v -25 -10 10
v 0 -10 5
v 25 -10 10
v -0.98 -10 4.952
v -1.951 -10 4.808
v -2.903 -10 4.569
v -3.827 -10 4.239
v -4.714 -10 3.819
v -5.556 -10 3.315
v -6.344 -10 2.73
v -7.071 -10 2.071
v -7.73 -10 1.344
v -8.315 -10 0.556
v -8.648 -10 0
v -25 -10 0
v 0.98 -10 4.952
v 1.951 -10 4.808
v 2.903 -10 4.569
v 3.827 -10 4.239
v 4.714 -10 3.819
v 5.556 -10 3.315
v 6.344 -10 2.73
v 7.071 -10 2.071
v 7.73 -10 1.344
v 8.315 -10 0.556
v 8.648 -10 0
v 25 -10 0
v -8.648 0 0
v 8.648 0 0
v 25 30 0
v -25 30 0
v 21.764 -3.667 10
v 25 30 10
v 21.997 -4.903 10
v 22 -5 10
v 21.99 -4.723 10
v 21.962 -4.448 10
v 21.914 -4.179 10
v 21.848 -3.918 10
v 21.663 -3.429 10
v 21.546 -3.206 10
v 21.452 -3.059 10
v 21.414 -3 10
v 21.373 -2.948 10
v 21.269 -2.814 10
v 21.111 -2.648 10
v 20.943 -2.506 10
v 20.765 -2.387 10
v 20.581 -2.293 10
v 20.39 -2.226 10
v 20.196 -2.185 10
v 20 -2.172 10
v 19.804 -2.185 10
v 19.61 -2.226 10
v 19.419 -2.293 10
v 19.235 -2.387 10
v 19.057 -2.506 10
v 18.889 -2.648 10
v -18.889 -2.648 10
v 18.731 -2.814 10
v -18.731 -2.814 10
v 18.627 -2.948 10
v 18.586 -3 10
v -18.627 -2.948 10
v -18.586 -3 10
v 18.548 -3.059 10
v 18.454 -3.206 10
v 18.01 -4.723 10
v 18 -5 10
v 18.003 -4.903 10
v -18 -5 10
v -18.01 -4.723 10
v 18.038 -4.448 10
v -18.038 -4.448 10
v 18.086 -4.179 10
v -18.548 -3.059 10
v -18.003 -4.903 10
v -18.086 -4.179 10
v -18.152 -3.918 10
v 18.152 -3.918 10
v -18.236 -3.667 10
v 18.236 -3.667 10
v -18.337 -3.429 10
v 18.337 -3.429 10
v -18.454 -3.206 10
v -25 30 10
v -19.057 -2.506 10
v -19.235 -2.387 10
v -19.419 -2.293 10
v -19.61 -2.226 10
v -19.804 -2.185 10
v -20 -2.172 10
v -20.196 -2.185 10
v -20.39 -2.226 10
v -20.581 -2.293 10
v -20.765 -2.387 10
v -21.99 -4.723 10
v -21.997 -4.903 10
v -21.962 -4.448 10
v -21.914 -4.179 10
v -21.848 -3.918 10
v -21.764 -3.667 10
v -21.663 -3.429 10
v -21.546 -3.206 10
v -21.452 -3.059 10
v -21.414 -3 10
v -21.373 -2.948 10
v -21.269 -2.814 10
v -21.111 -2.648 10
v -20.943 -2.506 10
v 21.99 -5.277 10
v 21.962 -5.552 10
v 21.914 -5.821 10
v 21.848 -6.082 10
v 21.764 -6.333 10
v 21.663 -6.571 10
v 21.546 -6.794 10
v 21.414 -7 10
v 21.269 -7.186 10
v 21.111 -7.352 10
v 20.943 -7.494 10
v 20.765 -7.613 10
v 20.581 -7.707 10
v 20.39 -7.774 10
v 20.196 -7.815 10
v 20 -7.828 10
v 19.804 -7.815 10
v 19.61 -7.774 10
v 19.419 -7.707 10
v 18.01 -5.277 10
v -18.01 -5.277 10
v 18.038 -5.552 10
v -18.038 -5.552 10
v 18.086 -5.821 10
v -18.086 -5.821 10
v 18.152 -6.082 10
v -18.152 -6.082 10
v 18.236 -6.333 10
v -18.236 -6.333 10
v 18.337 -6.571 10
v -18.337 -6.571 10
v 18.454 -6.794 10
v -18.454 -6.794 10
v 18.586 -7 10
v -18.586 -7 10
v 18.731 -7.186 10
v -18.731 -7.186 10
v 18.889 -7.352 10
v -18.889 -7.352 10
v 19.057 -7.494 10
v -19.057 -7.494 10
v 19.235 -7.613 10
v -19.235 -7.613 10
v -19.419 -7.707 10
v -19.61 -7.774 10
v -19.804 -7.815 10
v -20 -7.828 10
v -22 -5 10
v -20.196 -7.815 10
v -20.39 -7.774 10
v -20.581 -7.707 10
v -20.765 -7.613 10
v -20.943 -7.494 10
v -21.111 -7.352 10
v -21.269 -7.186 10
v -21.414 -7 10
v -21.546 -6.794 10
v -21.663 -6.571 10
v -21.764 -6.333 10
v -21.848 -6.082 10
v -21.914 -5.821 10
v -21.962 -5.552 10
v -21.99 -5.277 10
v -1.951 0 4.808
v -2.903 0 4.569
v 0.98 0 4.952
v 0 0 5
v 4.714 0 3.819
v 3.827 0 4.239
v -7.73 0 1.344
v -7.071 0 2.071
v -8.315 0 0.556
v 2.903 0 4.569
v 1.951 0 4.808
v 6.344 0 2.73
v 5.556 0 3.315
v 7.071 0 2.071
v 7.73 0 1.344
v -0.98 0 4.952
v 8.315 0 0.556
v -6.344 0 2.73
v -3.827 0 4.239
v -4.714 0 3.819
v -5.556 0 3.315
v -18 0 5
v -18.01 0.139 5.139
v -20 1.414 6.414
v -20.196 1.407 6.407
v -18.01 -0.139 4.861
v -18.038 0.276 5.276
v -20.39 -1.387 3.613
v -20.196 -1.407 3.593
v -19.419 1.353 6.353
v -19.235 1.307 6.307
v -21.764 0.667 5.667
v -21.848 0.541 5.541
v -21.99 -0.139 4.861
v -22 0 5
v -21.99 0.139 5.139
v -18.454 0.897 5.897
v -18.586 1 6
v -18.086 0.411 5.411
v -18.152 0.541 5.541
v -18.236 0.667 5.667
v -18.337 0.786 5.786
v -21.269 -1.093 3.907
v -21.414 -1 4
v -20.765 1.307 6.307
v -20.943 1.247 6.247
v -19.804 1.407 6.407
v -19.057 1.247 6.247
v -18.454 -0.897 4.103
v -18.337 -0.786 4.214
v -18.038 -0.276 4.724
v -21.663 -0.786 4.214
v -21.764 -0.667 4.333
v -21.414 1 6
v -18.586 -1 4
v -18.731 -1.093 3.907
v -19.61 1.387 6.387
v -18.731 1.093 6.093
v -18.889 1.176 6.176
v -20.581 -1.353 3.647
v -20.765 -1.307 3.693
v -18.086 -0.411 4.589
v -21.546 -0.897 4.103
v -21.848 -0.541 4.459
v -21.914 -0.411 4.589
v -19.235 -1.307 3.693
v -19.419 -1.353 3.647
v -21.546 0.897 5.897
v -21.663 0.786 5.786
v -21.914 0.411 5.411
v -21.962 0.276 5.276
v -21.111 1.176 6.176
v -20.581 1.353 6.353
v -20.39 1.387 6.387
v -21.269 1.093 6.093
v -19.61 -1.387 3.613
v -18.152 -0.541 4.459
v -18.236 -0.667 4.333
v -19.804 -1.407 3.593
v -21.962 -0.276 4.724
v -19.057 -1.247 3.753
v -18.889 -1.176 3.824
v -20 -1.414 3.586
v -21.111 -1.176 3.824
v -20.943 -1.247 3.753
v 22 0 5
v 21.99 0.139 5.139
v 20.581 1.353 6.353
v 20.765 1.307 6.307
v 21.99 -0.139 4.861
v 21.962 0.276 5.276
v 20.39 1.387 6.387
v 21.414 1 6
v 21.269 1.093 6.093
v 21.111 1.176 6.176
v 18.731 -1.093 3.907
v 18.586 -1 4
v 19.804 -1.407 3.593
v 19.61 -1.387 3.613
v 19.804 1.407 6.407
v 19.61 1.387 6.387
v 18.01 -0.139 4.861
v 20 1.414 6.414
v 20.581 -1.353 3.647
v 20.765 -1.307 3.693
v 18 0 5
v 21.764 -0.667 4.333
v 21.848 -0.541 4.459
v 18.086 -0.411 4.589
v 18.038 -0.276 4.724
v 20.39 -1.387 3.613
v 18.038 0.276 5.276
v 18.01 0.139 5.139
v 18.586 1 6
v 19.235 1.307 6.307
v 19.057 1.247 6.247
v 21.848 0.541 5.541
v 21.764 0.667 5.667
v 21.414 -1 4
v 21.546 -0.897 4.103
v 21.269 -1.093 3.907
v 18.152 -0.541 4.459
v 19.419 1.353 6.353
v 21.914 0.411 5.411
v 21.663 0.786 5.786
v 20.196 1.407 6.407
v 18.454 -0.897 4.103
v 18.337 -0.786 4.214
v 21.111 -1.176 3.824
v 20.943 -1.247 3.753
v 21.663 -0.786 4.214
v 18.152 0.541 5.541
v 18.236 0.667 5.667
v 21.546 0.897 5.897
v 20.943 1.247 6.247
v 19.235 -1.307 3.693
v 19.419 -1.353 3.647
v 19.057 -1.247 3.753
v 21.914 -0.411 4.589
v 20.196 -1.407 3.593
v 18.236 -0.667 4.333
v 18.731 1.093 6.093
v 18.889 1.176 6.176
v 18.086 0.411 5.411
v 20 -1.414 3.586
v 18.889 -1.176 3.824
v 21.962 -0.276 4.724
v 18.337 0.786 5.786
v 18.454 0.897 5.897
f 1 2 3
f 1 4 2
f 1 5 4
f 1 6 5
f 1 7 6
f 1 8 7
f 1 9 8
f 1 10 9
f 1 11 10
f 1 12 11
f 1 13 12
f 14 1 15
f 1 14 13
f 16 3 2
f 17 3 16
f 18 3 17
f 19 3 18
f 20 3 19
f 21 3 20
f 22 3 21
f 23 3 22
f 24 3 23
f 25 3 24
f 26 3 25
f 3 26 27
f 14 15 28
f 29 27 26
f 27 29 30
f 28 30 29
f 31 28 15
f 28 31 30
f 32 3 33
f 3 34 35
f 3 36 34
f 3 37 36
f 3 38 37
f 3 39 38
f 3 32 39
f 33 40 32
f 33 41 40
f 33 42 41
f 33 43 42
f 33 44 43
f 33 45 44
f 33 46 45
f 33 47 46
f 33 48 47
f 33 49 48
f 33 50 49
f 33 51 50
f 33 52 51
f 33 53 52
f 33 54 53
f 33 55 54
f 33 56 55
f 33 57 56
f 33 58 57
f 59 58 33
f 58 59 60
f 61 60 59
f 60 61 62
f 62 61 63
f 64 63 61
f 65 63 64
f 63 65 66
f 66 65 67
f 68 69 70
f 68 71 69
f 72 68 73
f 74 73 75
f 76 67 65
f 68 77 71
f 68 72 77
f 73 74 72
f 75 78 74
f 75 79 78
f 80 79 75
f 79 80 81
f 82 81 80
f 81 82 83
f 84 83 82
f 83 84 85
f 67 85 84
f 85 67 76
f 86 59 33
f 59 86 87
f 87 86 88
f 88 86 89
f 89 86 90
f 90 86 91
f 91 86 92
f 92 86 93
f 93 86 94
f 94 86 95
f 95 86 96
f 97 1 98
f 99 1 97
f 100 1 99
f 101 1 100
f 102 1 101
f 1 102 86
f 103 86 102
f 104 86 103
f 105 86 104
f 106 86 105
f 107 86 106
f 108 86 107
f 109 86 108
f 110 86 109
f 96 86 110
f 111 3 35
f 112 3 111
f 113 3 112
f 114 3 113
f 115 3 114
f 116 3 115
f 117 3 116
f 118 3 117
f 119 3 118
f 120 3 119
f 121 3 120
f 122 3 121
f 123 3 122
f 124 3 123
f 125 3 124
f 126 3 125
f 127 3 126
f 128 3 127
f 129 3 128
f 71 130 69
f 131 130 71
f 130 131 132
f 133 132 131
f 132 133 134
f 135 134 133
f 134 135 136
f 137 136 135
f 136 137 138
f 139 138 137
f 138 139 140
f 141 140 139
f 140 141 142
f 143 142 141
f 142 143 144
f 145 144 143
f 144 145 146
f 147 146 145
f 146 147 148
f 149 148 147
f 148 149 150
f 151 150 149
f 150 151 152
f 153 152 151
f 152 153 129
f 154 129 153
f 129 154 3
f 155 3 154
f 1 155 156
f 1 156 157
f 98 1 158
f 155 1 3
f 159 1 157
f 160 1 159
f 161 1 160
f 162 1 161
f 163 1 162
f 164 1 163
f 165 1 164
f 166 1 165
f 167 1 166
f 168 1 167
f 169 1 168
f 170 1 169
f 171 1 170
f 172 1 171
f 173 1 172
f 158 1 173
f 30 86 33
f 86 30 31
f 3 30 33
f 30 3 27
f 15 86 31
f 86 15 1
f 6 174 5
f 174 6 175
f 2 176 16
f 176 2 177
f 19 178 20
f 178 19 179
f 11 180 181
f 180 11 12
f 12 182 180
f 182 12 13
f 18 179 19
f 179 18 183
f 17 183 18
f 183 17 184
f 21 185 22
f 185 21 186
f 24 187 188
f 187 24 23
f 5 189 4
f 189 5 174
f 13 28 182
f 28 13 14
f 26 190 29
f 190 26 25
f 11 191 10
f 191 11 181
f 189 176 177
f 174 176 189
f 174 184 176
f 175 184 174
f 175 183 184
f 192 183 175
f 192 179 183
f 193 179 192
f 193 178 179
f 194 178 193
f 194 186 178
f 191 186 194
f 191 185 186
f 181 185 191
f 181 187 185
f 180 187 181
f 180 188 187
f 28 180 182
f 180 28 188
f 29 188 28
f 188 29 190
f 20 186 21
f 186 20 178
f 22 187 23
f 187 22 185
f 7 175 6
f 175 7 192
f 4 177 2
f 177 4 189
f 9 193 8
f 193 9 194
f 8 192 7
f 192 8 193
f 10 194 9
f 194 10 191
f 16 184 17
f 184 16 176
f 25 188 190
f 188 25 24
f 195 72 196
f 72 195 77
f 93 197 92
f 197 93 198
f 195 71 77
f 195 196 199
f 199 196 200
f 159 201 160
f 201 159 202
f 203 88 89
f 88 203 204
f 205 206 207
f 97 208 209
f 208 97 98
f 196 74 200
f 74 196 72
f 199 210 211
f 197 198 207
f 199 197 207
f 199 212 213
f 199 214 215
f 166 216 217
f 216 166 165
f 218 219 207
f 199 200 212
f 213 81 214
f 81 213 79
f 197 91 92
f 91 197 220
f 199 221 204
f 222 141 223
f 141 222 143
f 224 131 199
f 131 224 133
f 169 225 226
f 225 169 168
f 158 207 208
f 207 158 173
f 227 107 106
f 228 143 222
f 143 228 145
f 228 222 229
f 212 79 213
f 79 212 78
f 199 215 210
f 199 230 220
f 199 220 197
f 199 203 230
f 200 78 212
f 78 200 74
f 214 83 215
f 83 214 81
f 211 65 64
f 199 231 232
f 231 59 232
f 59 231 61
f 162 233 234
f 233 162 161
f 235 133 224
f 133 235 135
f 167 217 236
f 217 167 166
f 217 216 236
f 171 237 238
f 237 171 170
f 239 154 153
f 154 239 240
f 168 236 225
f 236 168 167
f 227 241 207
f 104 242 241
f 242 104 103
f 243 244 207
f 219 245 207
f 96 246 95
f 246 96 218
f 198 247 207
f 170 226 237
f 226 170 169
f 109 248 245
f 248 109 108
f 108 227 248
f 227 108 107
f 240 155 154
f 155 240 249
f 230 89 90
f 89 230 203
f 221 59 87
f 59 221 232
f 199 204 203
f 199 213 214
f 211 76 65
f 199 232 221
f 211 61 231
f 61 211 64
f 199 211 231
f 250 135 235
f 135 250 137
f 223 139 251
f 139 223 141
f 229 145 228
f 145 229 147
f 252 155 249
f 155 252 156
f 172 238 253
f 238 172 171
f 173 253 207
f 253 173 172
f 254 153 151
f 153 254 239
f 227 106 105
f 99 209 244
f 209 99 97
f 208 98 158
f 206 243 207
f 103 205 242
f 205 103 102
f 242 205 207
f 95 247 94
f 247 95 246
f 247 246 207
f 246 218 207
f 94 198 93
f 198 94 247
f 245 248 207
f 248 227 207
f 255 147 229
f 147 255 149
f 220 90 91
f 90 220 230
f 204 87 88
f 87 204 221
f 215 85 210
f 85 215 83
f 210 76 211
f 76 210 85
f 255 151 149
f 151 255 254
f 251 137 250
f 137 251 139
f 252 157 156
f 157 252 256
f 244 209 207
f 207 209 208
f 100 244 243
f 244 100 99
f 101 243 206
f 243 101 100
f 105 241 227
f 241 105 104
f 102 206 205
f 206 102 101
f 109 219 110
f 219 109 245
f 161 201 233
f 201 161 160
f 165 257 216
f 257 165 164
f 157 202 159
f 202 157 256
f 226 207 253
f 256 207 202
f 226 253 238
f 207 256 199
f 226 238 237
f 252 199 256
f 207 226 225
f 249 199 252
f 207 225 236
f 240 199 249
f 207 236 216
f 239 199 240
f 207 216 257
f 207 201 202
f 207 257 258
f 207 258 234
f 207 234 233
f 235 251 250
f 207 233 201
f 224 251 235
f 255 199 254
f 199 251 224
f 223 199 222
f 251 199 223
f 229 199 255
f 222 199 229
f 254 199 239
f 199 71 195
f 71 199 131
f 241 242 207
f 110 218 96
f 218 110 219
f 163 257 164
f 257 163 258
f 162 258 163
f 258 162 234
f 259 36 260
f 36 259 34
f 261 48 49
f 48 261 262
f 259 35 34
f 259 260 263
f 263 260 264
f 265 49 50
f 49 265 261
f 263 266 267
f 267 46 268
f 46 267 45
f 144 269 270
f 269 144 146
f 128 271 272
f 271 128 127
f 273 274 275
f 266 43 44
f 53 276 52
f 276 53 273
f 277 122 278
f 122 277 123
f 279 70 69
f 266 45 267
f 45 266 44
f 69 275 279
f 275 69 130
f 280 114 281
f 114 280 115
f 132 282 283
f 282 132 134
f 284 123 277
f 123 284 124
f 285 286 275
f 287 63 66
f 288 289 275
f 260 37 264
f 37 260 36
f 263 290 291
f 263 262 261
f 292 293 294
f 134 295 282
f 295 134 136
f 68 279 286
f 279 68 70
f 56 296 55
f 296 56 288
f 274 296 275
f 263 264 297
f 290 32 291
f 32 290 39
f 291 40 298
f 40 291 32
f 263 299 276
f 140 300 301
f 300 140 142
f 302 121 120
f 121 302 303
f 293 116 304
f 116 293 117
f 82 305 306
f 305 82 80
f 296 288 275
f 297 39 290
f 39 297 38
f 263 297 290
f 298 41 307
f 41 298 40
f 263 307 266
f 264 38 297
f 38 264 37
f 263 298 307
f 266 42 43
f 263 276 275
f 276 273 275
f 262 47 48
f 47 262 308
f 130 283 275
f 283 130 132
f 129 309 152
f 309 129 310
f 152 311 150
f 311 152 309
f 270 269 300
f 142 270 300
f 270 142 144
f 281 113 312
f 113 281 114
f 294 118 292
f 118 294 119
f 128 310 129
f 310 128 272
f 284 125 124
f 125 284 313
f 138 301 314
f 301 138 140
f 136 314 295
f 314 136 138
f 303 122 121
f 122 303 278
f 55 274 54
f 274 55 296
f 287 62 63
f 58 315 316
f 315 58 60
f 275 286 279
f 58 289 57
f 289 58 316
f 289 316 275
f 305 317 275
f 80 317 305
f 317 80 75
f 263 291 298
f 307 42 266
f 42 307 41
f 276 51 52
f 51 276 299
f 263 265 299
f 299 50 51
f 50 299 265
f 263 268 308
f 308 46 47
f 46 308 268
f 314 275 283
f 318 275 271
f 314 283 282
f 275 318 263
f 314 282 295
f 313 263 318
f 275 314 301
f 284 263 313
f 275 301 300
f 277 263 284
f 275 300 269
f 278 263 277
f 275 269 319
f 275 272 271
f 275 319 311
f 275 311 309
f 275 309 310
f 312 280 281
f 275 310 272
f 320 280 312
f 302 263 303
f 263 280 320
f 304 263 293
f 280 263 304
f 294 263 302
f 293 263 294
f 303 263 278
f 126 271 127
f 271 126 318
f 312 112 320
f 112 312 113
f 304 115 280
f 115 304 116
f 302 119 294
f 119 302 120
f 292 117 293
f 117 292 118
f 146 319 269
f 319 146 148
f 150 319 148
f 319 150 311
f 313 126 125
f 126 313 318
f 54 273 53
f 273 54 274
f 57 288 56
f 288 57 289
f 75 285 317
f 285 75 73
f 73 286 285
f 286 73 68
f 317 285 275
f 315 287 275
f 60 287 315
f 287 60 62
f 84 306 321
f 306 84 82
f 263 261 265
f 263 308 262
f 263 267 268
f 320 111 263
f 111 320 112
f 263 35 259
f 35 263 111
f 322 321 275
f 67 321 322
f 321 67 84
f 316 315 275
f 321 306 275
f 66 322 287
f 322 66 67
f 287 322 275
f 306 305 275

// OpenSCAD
module u_shaped_clamp() {
    difference() {
        union() {
            // Main body with chamfered edges
            hull() {
                translate([-25, -10, 0])
                    cube([50, 20, 10]);
                translate([-25, 10, 0])
                    cube([50, 20, 10]);
            }
            // Prongs
            translate([-25, -5, 0])
                cube([50, 5, 10]);
            translate([-25, 5, 0])
                cube([50, 5, 10]);
        }
        // Semicircular cutout
        translate([0, 0, -5])
            rotate([90, 0, 0])
                cylinder(r=10, h=20, $fn=64);
        // Through-holes
        translate([-20, 0, 5])
            rotate([45, 0, 0])
                cylinder(r=2, h=20, $fn=64);
        translate([20, 0, 5])
            rotate([45, 0, 0])
                cylinder(r=2, h=20, $fn=64);
    }
}

u_shaped_clamp();
